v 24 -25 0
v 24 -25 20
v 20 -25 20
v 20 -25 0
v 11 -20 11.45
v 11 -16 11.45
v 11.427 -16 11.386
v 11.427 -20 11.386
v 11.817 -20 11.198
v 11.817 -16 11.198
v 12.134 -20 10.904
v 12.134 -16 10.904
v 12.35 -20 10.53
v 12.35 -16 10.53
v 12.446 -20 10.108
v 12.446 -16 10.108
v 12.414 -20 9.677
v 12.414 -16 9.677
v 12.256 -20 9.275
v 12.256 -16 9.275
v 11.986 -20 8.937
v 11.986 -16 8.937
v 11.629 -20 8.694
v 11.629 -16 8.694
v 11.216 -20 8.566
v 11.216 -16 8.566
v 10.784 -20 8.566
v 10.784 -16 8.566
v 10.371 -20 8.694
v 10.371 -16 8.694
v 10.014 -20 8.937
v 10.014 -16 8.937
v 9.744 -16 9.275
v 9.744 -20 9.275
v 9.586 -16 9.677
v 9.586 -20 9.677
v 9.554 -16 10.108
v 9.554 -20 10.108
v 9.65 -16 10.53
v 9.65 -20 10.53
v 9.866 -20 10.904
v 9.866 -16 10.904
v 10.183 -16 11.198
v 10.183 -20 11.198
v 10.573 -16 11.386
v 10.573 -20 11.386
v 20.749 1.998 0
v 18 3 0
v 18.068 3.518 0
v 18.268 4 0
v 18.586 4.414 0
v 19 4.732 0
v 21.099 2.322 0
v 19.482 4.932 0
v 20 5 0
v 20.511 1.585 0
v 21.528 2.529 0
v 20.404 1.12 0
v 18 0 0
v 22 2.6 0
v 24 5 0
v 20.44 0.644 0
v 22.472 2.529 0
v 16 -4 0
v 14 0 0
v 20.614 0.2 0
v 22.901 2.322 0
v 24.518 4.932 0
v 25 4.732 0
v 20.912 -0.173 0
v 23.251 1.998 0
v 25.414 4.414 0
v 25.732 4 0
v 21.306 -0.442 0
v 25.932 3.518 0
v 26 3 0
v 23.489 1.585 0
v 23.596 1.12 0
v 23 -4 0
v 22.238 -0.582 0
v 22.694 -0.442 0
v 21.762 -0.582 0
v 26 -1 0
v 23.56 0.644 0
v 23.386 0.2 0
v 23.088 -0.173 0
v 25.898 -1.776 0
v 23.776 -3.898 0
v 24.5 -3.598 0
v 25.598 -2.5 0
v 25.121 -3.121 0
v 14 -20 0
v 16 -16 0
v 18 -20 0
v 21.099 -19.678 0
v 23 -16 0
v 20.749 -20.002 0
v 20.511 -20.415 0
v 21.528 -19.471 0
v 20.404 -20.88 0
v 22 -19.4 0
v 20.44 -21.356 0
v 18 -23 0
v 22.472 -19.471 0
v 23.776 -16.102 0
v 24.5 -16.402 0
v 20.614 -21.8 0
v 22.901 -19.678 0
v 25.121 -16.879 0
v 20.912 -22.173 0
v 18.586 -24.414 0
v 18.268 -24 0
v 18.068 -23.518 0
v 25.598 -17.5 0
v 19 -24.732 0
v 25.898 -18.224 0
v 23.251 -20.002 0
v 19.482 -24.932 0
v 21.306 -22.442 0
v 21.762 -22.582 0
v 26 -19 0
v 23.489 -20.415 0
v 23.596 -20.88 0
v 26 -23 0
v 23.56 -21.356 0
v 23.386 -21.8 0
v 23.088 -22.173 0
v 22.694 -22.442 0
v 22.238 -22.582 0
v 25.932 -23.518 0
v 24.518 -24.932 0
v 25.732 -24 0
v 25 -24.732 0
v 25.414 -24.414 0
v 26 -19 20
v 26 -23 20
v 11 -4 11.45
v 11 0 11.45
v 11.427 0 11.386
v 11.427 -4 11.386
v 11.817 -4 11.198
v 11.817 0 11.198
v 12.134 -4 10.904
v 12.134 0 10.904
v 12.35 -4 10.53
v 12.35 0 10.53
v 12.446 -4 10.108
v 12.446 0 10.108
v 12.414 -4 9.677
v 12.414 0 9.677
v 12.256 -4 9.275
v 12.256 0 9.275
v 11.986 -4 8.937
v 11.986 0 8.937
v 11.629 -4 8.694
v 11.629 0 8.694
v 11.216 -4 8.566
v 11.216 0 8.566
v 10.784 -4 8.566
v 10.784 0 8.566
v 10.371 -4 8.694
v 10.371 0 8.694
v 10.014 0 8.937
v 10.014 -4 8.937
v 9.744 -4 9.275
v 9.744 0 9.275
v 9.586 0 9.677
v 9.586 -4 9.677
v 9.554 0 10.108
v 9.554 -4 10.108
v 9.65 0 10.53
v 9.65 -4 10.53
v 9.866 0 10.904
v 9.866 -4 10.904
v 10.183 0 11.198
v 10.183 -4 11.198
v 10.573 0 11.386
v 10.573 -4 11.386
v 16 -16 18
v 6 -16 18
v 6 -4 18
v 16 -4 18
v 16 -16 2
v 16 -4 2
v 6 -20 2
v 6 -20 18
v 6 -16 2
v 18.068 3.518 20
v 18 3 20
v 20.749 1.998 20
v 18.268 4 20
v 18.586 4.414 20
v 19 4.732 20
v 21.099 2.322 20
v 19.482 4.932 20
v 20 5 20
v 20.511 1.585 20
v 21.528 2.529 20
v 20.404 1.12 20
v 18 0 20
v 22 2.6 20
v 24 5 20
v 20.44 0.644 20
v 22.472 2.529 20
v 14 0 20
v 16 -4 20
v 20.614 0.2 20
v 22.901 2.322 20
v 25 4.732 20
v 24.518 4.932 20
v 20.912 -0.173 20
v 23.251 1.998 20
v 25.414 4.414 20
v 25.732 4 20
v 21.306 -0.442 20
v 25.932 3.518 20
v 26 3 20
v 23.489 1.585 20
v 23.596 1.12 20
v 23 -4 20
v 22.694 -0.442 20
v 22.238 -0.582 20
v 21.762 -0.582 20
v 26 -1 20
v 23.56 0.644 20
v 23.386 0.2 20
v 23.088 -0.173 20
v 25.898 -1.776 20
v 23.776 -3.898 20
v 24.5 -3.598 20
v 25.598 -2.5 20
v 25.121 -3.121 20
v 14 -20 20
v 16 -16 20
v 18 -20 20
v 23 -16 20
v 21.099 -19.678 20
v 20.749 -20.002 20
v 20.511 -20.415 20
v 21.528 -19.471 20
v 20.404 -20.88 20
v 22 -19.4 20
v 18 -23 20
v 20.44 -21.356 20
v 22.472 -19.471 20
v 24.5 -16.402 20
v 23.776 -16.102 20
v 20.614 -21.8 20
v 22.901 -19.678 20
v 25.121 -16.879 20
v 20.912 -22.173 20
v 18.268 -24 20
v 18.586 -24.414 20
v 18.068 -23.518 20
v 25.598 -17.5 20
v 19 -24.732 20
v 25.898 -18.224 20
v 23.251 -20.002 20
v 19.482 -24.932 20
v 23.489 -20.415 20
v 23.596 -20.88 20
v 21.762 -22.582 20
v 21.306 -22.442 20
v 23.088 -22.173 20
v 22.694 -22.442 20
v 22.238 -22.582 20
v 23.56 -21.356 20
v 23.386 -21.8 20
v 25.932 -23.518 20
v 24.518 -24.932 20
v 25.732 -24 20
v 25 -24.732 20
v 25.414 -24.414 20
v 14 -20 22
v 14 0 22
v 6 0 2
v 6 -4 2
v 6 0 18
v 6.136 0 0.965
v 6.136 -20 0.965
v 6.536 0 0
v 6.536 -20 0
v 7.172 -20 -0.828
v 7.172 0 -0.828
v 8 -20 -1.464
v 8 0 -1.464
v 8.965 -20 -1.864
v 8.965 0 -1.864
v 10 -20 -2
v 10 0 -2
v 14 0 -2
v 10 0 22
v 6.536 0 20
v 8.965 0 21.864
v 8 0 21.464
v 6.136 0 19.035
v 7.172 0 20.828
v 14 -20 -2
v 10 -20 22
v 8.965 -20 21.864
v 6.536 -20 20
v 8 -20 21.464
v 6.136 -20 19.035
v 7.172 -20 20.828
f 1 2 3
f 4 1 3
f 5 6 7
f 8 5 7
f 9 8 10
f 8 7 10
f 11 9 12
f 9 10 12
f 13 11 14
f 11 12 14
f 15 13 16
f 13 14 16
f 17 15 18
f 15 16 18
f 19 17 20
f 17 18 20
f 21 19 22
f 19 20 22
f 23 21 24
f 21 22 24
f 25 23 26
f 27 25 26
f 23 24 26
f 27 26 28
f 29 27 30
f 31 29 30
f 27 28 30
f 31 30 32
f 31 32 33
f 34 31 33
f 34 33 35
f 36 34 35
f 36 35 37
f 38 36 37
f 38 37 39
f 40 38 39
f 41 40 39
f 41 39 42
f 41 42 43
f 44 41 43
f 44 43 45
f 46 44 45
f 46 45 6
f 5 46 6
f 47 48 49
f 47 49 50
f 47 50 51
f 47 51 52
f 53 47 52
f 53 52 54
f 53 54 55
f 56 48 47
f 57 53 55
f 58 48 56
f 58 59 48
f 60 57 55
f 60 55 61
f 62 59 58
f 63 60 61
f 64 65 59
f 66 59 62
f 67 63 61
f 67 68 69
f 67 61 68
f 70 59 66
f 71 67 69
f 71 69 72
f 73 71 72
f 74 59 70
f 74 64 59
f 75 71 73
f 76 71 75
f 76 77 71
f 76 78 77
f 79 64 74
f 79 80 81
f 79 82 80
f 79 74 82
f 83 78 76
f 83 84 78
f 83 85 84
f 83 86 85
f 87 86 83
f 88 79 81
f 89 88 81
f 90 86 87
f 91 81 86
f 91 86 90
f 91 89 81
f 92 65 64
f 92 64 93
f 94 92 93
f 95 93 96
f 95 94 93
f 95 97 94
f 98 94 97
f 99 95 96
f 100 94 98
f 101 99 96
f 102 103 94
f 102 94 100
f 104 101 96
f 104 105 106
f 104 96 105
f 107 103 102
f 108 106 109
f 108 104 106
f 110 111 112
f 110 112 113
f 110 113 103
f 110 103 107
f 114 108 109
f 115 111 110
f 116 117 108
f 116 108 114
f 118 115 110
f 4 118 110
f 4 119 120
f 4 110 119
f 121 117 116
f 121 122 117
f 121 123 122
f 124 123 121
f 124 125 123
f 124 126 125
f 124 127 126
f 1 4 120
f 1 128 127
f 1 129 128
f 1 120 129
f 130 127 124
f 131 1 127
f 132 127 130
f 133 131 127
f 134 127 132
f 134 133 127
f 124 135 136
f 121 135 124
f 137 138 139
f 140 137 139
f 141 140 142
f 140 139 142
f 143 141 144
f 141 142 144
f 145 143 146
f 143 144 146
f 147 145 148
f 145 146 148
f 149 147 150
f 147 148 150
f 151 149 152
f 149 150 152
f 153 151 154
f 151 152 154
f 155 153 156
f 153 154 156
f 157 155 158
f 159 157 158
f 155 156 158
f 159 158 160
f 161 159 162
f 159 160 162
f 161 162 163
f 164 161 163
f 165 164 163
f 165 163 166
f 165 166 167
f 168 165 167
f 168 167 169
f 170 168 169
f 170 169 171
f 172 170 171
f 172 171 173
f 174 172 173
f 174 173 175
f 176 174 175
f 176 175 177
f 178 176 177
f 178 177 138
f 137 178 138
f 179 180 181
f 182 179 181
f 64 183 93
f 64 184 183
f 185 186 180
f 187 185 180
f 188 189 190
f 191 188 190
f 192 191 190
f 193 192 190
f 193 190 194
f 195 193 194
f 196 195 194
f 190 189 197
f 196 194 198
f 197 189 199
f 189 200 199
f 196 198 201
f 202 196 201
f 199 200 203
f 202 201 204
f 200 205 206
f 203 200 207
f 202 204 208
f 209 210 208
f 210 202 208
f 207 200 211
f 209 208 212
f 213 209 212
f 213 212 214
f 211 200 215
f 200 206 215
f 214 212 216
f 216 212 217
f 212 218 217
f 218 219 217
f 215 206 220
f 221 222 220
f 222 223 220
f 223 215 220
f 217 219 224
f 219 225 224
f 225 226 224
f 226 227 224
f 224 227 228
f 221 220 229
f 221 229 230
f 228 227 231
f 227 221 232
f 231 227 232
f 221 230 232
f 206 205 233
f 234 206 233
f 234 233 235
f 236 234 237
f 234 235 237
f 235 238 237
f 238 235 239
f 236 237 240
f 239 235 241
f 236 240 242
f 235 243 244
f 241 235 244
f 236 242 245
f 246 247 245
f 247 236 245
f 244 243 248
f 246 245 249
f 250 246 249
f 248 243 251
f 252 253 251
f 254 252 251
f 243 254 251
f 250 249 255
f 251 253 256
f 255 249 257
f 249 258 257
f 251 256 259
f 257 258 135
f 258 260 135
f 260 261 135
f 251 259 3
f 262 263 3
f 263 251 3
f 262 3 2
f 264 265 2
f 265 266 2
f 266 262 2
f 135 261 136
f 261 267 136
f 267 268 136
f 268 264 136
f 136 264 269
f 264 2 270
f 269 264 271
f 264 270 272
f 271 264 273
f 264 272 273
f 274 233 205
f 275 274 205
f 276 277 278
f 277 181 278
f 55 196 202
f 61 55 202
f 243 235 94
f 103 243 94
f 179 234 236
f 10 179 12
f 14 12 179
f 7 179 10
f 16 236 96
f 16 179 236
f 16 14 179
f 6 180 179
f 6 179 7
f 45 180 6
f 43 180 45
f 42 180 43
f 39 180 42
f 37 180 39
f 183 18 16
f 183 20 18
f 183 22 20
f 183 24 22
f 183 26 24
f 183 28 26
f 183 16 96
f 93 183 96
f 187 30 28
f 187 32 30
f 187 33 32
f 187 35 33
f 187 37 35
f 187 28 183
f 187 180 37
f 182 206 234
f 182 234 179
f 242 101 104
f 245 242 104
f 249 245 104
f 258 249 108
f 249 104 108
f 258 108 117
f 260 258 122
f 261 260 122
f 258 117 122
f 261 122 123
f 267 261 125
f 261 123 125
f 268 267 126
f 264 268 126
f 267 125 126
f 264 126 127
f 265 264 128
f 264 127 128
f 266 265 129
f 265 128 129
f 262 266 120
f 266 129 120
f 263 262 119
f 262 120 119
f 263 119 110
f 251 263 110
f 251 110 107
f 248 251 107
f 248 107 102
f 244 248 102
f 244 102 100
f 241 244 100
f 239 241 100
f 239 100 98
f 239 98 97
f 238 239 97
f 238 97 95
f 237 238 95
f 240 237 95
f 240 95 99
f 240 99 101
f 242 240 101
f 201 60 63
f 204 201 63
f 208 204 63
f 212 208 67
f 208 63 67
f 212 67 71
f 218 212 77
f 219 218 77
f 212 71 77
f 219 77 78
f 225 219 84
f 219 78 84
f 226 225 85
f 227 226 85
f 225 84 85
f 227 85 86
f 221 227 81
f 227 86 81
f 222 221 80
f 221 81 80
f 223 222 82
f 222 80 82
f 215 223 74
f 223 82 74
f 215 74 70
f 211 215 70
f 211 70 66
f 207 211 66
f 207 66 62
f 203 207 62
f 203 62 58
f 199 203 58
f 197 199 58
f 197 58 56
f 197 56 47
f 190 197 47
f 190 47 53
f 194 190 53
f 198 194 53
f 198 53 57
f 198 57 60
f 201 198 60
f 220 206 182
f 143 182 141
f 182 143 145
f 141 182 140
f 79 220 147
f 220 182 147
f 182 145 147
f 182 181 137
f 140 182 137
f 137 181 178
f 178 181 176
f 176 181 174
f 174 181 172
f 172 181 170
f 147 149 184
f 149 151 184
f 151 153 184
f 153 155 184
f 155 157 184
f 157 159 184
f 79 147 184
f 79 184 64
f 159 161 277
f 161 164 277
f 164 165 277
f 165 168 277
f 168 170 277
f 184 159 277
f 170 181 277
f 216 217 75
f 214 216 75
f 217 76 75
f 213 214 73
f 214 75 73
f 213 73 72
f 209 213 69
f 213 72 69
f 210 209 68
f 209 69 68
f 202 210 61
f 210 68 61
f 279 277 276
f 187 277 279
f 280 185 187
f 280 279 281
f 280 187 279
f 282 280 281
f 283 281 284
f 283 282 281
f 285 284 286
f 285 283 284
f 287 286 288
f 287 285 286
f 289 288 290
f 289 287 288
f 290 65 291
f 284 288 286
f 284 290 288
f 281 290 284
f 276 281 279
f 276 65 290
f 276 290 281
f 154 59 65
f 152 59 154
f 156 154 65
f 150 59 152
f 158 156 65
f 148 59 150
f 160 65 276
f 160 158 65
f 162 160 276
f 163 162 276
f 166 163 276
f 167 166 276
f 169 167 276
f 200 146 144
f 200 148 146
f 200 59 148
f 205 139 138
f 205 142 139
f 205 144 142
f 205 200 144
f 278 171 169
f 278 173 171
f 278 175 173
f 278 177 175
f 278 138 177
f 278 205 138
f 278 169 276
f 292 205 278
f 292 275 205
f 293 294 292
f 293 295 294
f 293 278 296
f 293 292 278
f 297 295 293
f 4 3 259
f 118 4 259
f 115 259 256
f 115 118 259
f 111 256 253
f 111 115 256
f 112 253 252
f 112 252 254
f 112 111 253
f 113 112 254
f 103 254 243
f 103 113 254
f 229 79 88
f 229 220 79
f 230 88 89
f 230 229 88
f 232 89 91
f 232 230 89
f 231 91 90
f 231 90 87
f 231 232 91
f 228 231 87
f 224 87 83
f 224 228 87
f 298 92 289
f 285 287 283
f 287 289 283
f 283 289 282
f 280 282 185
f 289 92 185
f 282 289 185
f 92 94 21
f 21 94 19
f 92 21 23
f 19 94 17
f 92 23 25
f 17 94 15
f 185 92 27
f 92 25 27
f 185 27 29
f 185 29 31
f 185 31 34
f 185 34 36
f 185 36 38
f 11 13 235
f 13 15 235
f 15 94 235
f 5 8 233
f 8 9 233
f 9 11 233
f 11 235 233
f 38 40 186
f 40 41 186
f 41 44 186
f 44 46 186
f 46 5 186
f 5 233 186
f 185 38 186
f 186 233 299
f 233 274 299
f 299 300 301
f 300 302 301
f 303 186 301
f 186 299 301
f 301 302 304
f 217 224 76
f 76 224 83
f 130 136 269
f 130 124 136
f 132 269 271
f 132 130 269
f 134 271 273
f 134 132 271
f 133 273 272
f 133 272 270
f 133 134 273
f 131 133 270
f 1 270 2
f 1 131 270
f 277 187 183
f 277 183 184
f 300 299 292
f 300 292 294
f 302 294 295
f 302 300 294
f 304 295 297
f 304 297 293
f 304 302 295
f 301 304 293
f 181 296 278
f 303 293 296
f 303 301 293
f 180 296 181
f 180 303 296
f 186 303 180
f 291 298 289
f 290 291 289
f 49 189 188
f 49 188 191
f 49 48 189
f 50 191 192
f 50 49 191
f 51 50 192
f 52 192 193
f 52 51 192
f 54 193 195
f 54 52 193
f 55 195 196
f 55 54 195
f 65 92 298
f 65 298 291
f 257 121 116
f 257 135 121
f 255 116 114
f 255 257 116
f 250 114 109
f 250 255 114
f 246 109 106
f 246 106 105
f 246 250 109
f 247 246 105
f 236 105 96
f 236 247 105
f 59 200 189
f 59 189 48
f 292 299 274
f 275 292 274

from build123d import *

# Parameters (mm, degrees)
SKETCH1_W           = 20
SKETCH1_H           = 20
BOSS_EXTRUDE1_DEPTH = 4
SKETCH2_R           = 3.7
CUT_EXTRUDE1_DEPTH  = 2.6
SKETCH3_R           = 2.1
CUT_EXTRUDE2_DEPTH  = 29.403520909
SKETCH4_W           = 12
SKETCH4_H           = 4
BOSS_EXTRUDE2_DEPTH = 12
SKETCH7_W           = 20
SKETCH7_H           = 4
BOSS_EXTRUDE3_DEPTH = 10
SKETCH8_W           = 8
SKETCH8_H           = 20
BOSS_EXTRUDE4_DEPTH = 5
SKETCH9_W           = 8
SKETCH9_H           = 20
BOSS_EXTRUDE5_DEPTH = 5
SKETCH10_R          = 1.6
CUT_EXTRUDE5_DEPTH  = 42.243181255
SKETCH11_W          = 30
SKETCH11_H          = 30
CUT_EXTRUDE6_DEPTH  = 6
SKETCH12_R          = 1.45
CUT_EXTRUDE7_DEPTH  = 42.243181255
SKETCH13_W          = 8
SKETCH13_H          = 20
BOSS_EXTRUDE6_DEPTH = 2
SKETCH14_W          = 8
SKETCH14_H          = 20
BOSS_EXTRUDE7_DEPTH = 2
SKETCH15_W          = 16
SKETCH15_H          = 12
CUT_EXTRUDE8_DEPTH  = 39.845849199
FILLET2_R           = 3
FILLET4_R           = 2
FILLET5_START       = -21
FILLET5_DEPTH       = 22


with BuildPart() as part:
    # Sketch1 → Boss-Extrude1 (new body)
    with BuildSketch(Plane(origin=(0, 0, 0), x_dir=(0, 0, -1), z_dir=(1, 0, 0))):
        with Locations((-10, -10)):
            Rectangle(SKETCH1_W, SKETCH1_H)
    extrude(amount=BOSS_EXTRUDE1_DEPTH)

    # Sketch2 → Cut-Extrude1 (cut)
    with BuildSketch(Plane(origin=(4, 0, 0), x_dir=(0, 0, -1), z_dir=(1, 0, 0))):
        with Locations((-10, -10)):
            Circle(SKETCH2_R)
    extrude(amount=-CUT_EXTRUDE1_DEPTH, mode=Mode.SUBTRACT)

    # Sketch3 → Cut-Extrude2 (cut, through all)
    with BuildSketch(Plane(origin=(1.4, 0, 0), x_dir=(0, 0, -1), z_dir=(1, 0, 0))):
        with Locations((-10, -10)):
            Circle(SKETCH3_R)
    extrude(amount=-CUT_EXTRUDE2_DEPTH, mode=Mode.SUBTRACT)

    # Sketch4 → Boss-Extrude2 (add)
    with BuildSketch(Plane(origin=(4, 0, 0), x_dir=(0, 0, -1), z_dir=(1, 0, 0))):
        Polygon((-20, 0), (-20, -20), (-16, -20), (-16, -16), (-16, -4), (-16, 0), align=None)
        with Locations((-10, -18)):
            Rectangle(SKETCH4_W, SKETCH4_H)
        Polygon((-4, -16), (-4, -20), (0, -20), (0, -4), (-4, -4), align=None)
        Polygon((0, 0), (-16, 0), (-16, -4), (-4, -4), (0, -4), align=None)
    extrude(amount=BOSS_EXTRUDE2_DEPTH)

    # Sketch7 → Boss-Extrude3 (add)
    with BuildSketch(Plane(origin=(16, 0, 0), x_dir=(0, 0, -1), z_dir=(1, 0, 0))):
        with Locations((-10, -18)):
            Rectangle(SKETCH7_W, SKETCH7_H)
        with Locations((-10, -2)):
            Rectangle(SKETCH7_W, SKETCH7_H)
    extrude(amount=BOSS_EXTRUDE3_DEPTH)

    # Sketch8 → Boss-Extrude4 (add)
    with BuildSketch(Plane(origin=(0, -20, 0), x_dir=(-1, 0, 0), z_dir=(0, -1, 0))):
        with Locations((-22, -10)):
            Rectangle(SKETCH8_W, SKETCH8_H)
    extrude(amount=BOSS_EXTRUDE4_DEPTH)

    # Sketch9 → Boss-Extrude5 (add)
    with BuildSketch(Plane(origin=(0, 0, 0), x_dir=(1, 0, 0), z_dir=(0, 1, 0))):
        with Locations((22, -10)):
            Rectangle(SKETCH9_W, SKETCH9_H)
    extrude(amount=BOSS_EXTRUDE5_DEPTH)

    # Sketch10 → Cut-Extrude5 (cut, through all)
    with BuildSketch(Plane(origin=(0, 0, 0), x_dir=(-1, 0, 0), z_dir=(0, 0, -1))):
        with Locations(Location((-22, 1, 0), (0, 0, 90))):
            Circle(SKETCH10_R)
        with Locations(Location((-22, -21, 0), (0, 0, 90))):
            Circle(SKETCH10_R)
    extrude(amount=-CUT_EXTRUDE5_DEPTH, mode=Mode.SUBTRACT)

    # Sketch11 → Cut-Extrude6 (cut)
    with BuildSketch(Plane.ZY):
        with Locations((15, -5)):
            Rectangle(SKETCH11_W, SKETCH11_H)
    extrude(amount=-CUT_EXTRUDE6_DEPTH, mode=Mode.SUBTRACT)

    # Sketch12 → Cut-Extrude7 (cut, through all)
    with BuildSketch(Plane(origin=(0, 0, 0), x_dir=(1, 0, 0), z_dir=(0, 1, 0))):
        with Locations(Location((11, -10, 0), (0, 0, 270))):
            Circle(SKETCH12_R)
    extrude(amount=-CUT_EXTRUDE7_DEPTH, mode=Mode.SUBTRACT)

    # Sketch13 → Boss-Extrude6 (add)
    with BuildSketch(Plane.XY.offset(20)):
        with Locations((10, -10)):
            Rectangle(SKETCH13_W, SKETCH13_H)
    extrude(amount=BOSS_EXTRUDE6_DEPTH)

    # Sketch14 → Boss-Extrude7 (add)
    with BuildSketch(Plane(origin=(0, 0, 0), x_dir=(-1, 0, 0), z_dir=(0, 0, -1))):
        with Locations((-10, -10)):
            Rectangle(SKETCH14_W, SKETCH14_H)
    extrude(amount=BOSS_EXTRUDE7_DEPTH)

    # Sketch15 → Cut-Extrude8 (cut, through all)
    with BuildSketch(Plane.ZY.offset(-6)):
        with Locations((10, -10)):
            Rectangle(SKETCH15_W, SKETCH15_H)
    extrude(amount=-CUT_EXTRUDE8_DEPTH, mode=Mode.SUBTRACT)

    # Fillet2
    fillet2_edges = [part.edges().sort_by_distance(p)[0] for p in [
        (26, -16, 10),
        (26, -4, 10),
    ]]
    fillet(fillet2_edges, radius=FILLET2_R)

    # Fillet4
    fillet4_edges = [part.edges().sort_by_distance(p)[0] for p in [
        (26, -25, 10),
        (18, -25, 10),
        (26, 5, 10),
        (18, 5, 10),
    ]]
    fillet(fillet4_edges, radius=FILLET4_R)

    # Fillet5: read off the stored shape, not the designer's step
    # Fillet5 outline → Fillet5 (cut)
    with BuildSketch(Plane(origin=(0, 0, 0), x_dir=(1, 0, 0), z_dir=(0, 1, 0)).offset(FILLET5_START)):
        with BuildLine():
            Line((6, 2), (6, -2))
            ThreePointArc((6, -2), (7.171572875, 0.828427125), (10, 2))
            Line((10, 2), (6, 2))
        make_face()
        with BuildLine():
            ThreePointArc((10, -22), (7.171572875, -20.828427125), (6, -18))
            Line((6, -18), (6, -22))
            Line((6, -22), (10, -22))
        make_face()
    extrude(amount=FILLET5_DEPTH, mode=Mode.SUBTRACT)


solid = part.part
